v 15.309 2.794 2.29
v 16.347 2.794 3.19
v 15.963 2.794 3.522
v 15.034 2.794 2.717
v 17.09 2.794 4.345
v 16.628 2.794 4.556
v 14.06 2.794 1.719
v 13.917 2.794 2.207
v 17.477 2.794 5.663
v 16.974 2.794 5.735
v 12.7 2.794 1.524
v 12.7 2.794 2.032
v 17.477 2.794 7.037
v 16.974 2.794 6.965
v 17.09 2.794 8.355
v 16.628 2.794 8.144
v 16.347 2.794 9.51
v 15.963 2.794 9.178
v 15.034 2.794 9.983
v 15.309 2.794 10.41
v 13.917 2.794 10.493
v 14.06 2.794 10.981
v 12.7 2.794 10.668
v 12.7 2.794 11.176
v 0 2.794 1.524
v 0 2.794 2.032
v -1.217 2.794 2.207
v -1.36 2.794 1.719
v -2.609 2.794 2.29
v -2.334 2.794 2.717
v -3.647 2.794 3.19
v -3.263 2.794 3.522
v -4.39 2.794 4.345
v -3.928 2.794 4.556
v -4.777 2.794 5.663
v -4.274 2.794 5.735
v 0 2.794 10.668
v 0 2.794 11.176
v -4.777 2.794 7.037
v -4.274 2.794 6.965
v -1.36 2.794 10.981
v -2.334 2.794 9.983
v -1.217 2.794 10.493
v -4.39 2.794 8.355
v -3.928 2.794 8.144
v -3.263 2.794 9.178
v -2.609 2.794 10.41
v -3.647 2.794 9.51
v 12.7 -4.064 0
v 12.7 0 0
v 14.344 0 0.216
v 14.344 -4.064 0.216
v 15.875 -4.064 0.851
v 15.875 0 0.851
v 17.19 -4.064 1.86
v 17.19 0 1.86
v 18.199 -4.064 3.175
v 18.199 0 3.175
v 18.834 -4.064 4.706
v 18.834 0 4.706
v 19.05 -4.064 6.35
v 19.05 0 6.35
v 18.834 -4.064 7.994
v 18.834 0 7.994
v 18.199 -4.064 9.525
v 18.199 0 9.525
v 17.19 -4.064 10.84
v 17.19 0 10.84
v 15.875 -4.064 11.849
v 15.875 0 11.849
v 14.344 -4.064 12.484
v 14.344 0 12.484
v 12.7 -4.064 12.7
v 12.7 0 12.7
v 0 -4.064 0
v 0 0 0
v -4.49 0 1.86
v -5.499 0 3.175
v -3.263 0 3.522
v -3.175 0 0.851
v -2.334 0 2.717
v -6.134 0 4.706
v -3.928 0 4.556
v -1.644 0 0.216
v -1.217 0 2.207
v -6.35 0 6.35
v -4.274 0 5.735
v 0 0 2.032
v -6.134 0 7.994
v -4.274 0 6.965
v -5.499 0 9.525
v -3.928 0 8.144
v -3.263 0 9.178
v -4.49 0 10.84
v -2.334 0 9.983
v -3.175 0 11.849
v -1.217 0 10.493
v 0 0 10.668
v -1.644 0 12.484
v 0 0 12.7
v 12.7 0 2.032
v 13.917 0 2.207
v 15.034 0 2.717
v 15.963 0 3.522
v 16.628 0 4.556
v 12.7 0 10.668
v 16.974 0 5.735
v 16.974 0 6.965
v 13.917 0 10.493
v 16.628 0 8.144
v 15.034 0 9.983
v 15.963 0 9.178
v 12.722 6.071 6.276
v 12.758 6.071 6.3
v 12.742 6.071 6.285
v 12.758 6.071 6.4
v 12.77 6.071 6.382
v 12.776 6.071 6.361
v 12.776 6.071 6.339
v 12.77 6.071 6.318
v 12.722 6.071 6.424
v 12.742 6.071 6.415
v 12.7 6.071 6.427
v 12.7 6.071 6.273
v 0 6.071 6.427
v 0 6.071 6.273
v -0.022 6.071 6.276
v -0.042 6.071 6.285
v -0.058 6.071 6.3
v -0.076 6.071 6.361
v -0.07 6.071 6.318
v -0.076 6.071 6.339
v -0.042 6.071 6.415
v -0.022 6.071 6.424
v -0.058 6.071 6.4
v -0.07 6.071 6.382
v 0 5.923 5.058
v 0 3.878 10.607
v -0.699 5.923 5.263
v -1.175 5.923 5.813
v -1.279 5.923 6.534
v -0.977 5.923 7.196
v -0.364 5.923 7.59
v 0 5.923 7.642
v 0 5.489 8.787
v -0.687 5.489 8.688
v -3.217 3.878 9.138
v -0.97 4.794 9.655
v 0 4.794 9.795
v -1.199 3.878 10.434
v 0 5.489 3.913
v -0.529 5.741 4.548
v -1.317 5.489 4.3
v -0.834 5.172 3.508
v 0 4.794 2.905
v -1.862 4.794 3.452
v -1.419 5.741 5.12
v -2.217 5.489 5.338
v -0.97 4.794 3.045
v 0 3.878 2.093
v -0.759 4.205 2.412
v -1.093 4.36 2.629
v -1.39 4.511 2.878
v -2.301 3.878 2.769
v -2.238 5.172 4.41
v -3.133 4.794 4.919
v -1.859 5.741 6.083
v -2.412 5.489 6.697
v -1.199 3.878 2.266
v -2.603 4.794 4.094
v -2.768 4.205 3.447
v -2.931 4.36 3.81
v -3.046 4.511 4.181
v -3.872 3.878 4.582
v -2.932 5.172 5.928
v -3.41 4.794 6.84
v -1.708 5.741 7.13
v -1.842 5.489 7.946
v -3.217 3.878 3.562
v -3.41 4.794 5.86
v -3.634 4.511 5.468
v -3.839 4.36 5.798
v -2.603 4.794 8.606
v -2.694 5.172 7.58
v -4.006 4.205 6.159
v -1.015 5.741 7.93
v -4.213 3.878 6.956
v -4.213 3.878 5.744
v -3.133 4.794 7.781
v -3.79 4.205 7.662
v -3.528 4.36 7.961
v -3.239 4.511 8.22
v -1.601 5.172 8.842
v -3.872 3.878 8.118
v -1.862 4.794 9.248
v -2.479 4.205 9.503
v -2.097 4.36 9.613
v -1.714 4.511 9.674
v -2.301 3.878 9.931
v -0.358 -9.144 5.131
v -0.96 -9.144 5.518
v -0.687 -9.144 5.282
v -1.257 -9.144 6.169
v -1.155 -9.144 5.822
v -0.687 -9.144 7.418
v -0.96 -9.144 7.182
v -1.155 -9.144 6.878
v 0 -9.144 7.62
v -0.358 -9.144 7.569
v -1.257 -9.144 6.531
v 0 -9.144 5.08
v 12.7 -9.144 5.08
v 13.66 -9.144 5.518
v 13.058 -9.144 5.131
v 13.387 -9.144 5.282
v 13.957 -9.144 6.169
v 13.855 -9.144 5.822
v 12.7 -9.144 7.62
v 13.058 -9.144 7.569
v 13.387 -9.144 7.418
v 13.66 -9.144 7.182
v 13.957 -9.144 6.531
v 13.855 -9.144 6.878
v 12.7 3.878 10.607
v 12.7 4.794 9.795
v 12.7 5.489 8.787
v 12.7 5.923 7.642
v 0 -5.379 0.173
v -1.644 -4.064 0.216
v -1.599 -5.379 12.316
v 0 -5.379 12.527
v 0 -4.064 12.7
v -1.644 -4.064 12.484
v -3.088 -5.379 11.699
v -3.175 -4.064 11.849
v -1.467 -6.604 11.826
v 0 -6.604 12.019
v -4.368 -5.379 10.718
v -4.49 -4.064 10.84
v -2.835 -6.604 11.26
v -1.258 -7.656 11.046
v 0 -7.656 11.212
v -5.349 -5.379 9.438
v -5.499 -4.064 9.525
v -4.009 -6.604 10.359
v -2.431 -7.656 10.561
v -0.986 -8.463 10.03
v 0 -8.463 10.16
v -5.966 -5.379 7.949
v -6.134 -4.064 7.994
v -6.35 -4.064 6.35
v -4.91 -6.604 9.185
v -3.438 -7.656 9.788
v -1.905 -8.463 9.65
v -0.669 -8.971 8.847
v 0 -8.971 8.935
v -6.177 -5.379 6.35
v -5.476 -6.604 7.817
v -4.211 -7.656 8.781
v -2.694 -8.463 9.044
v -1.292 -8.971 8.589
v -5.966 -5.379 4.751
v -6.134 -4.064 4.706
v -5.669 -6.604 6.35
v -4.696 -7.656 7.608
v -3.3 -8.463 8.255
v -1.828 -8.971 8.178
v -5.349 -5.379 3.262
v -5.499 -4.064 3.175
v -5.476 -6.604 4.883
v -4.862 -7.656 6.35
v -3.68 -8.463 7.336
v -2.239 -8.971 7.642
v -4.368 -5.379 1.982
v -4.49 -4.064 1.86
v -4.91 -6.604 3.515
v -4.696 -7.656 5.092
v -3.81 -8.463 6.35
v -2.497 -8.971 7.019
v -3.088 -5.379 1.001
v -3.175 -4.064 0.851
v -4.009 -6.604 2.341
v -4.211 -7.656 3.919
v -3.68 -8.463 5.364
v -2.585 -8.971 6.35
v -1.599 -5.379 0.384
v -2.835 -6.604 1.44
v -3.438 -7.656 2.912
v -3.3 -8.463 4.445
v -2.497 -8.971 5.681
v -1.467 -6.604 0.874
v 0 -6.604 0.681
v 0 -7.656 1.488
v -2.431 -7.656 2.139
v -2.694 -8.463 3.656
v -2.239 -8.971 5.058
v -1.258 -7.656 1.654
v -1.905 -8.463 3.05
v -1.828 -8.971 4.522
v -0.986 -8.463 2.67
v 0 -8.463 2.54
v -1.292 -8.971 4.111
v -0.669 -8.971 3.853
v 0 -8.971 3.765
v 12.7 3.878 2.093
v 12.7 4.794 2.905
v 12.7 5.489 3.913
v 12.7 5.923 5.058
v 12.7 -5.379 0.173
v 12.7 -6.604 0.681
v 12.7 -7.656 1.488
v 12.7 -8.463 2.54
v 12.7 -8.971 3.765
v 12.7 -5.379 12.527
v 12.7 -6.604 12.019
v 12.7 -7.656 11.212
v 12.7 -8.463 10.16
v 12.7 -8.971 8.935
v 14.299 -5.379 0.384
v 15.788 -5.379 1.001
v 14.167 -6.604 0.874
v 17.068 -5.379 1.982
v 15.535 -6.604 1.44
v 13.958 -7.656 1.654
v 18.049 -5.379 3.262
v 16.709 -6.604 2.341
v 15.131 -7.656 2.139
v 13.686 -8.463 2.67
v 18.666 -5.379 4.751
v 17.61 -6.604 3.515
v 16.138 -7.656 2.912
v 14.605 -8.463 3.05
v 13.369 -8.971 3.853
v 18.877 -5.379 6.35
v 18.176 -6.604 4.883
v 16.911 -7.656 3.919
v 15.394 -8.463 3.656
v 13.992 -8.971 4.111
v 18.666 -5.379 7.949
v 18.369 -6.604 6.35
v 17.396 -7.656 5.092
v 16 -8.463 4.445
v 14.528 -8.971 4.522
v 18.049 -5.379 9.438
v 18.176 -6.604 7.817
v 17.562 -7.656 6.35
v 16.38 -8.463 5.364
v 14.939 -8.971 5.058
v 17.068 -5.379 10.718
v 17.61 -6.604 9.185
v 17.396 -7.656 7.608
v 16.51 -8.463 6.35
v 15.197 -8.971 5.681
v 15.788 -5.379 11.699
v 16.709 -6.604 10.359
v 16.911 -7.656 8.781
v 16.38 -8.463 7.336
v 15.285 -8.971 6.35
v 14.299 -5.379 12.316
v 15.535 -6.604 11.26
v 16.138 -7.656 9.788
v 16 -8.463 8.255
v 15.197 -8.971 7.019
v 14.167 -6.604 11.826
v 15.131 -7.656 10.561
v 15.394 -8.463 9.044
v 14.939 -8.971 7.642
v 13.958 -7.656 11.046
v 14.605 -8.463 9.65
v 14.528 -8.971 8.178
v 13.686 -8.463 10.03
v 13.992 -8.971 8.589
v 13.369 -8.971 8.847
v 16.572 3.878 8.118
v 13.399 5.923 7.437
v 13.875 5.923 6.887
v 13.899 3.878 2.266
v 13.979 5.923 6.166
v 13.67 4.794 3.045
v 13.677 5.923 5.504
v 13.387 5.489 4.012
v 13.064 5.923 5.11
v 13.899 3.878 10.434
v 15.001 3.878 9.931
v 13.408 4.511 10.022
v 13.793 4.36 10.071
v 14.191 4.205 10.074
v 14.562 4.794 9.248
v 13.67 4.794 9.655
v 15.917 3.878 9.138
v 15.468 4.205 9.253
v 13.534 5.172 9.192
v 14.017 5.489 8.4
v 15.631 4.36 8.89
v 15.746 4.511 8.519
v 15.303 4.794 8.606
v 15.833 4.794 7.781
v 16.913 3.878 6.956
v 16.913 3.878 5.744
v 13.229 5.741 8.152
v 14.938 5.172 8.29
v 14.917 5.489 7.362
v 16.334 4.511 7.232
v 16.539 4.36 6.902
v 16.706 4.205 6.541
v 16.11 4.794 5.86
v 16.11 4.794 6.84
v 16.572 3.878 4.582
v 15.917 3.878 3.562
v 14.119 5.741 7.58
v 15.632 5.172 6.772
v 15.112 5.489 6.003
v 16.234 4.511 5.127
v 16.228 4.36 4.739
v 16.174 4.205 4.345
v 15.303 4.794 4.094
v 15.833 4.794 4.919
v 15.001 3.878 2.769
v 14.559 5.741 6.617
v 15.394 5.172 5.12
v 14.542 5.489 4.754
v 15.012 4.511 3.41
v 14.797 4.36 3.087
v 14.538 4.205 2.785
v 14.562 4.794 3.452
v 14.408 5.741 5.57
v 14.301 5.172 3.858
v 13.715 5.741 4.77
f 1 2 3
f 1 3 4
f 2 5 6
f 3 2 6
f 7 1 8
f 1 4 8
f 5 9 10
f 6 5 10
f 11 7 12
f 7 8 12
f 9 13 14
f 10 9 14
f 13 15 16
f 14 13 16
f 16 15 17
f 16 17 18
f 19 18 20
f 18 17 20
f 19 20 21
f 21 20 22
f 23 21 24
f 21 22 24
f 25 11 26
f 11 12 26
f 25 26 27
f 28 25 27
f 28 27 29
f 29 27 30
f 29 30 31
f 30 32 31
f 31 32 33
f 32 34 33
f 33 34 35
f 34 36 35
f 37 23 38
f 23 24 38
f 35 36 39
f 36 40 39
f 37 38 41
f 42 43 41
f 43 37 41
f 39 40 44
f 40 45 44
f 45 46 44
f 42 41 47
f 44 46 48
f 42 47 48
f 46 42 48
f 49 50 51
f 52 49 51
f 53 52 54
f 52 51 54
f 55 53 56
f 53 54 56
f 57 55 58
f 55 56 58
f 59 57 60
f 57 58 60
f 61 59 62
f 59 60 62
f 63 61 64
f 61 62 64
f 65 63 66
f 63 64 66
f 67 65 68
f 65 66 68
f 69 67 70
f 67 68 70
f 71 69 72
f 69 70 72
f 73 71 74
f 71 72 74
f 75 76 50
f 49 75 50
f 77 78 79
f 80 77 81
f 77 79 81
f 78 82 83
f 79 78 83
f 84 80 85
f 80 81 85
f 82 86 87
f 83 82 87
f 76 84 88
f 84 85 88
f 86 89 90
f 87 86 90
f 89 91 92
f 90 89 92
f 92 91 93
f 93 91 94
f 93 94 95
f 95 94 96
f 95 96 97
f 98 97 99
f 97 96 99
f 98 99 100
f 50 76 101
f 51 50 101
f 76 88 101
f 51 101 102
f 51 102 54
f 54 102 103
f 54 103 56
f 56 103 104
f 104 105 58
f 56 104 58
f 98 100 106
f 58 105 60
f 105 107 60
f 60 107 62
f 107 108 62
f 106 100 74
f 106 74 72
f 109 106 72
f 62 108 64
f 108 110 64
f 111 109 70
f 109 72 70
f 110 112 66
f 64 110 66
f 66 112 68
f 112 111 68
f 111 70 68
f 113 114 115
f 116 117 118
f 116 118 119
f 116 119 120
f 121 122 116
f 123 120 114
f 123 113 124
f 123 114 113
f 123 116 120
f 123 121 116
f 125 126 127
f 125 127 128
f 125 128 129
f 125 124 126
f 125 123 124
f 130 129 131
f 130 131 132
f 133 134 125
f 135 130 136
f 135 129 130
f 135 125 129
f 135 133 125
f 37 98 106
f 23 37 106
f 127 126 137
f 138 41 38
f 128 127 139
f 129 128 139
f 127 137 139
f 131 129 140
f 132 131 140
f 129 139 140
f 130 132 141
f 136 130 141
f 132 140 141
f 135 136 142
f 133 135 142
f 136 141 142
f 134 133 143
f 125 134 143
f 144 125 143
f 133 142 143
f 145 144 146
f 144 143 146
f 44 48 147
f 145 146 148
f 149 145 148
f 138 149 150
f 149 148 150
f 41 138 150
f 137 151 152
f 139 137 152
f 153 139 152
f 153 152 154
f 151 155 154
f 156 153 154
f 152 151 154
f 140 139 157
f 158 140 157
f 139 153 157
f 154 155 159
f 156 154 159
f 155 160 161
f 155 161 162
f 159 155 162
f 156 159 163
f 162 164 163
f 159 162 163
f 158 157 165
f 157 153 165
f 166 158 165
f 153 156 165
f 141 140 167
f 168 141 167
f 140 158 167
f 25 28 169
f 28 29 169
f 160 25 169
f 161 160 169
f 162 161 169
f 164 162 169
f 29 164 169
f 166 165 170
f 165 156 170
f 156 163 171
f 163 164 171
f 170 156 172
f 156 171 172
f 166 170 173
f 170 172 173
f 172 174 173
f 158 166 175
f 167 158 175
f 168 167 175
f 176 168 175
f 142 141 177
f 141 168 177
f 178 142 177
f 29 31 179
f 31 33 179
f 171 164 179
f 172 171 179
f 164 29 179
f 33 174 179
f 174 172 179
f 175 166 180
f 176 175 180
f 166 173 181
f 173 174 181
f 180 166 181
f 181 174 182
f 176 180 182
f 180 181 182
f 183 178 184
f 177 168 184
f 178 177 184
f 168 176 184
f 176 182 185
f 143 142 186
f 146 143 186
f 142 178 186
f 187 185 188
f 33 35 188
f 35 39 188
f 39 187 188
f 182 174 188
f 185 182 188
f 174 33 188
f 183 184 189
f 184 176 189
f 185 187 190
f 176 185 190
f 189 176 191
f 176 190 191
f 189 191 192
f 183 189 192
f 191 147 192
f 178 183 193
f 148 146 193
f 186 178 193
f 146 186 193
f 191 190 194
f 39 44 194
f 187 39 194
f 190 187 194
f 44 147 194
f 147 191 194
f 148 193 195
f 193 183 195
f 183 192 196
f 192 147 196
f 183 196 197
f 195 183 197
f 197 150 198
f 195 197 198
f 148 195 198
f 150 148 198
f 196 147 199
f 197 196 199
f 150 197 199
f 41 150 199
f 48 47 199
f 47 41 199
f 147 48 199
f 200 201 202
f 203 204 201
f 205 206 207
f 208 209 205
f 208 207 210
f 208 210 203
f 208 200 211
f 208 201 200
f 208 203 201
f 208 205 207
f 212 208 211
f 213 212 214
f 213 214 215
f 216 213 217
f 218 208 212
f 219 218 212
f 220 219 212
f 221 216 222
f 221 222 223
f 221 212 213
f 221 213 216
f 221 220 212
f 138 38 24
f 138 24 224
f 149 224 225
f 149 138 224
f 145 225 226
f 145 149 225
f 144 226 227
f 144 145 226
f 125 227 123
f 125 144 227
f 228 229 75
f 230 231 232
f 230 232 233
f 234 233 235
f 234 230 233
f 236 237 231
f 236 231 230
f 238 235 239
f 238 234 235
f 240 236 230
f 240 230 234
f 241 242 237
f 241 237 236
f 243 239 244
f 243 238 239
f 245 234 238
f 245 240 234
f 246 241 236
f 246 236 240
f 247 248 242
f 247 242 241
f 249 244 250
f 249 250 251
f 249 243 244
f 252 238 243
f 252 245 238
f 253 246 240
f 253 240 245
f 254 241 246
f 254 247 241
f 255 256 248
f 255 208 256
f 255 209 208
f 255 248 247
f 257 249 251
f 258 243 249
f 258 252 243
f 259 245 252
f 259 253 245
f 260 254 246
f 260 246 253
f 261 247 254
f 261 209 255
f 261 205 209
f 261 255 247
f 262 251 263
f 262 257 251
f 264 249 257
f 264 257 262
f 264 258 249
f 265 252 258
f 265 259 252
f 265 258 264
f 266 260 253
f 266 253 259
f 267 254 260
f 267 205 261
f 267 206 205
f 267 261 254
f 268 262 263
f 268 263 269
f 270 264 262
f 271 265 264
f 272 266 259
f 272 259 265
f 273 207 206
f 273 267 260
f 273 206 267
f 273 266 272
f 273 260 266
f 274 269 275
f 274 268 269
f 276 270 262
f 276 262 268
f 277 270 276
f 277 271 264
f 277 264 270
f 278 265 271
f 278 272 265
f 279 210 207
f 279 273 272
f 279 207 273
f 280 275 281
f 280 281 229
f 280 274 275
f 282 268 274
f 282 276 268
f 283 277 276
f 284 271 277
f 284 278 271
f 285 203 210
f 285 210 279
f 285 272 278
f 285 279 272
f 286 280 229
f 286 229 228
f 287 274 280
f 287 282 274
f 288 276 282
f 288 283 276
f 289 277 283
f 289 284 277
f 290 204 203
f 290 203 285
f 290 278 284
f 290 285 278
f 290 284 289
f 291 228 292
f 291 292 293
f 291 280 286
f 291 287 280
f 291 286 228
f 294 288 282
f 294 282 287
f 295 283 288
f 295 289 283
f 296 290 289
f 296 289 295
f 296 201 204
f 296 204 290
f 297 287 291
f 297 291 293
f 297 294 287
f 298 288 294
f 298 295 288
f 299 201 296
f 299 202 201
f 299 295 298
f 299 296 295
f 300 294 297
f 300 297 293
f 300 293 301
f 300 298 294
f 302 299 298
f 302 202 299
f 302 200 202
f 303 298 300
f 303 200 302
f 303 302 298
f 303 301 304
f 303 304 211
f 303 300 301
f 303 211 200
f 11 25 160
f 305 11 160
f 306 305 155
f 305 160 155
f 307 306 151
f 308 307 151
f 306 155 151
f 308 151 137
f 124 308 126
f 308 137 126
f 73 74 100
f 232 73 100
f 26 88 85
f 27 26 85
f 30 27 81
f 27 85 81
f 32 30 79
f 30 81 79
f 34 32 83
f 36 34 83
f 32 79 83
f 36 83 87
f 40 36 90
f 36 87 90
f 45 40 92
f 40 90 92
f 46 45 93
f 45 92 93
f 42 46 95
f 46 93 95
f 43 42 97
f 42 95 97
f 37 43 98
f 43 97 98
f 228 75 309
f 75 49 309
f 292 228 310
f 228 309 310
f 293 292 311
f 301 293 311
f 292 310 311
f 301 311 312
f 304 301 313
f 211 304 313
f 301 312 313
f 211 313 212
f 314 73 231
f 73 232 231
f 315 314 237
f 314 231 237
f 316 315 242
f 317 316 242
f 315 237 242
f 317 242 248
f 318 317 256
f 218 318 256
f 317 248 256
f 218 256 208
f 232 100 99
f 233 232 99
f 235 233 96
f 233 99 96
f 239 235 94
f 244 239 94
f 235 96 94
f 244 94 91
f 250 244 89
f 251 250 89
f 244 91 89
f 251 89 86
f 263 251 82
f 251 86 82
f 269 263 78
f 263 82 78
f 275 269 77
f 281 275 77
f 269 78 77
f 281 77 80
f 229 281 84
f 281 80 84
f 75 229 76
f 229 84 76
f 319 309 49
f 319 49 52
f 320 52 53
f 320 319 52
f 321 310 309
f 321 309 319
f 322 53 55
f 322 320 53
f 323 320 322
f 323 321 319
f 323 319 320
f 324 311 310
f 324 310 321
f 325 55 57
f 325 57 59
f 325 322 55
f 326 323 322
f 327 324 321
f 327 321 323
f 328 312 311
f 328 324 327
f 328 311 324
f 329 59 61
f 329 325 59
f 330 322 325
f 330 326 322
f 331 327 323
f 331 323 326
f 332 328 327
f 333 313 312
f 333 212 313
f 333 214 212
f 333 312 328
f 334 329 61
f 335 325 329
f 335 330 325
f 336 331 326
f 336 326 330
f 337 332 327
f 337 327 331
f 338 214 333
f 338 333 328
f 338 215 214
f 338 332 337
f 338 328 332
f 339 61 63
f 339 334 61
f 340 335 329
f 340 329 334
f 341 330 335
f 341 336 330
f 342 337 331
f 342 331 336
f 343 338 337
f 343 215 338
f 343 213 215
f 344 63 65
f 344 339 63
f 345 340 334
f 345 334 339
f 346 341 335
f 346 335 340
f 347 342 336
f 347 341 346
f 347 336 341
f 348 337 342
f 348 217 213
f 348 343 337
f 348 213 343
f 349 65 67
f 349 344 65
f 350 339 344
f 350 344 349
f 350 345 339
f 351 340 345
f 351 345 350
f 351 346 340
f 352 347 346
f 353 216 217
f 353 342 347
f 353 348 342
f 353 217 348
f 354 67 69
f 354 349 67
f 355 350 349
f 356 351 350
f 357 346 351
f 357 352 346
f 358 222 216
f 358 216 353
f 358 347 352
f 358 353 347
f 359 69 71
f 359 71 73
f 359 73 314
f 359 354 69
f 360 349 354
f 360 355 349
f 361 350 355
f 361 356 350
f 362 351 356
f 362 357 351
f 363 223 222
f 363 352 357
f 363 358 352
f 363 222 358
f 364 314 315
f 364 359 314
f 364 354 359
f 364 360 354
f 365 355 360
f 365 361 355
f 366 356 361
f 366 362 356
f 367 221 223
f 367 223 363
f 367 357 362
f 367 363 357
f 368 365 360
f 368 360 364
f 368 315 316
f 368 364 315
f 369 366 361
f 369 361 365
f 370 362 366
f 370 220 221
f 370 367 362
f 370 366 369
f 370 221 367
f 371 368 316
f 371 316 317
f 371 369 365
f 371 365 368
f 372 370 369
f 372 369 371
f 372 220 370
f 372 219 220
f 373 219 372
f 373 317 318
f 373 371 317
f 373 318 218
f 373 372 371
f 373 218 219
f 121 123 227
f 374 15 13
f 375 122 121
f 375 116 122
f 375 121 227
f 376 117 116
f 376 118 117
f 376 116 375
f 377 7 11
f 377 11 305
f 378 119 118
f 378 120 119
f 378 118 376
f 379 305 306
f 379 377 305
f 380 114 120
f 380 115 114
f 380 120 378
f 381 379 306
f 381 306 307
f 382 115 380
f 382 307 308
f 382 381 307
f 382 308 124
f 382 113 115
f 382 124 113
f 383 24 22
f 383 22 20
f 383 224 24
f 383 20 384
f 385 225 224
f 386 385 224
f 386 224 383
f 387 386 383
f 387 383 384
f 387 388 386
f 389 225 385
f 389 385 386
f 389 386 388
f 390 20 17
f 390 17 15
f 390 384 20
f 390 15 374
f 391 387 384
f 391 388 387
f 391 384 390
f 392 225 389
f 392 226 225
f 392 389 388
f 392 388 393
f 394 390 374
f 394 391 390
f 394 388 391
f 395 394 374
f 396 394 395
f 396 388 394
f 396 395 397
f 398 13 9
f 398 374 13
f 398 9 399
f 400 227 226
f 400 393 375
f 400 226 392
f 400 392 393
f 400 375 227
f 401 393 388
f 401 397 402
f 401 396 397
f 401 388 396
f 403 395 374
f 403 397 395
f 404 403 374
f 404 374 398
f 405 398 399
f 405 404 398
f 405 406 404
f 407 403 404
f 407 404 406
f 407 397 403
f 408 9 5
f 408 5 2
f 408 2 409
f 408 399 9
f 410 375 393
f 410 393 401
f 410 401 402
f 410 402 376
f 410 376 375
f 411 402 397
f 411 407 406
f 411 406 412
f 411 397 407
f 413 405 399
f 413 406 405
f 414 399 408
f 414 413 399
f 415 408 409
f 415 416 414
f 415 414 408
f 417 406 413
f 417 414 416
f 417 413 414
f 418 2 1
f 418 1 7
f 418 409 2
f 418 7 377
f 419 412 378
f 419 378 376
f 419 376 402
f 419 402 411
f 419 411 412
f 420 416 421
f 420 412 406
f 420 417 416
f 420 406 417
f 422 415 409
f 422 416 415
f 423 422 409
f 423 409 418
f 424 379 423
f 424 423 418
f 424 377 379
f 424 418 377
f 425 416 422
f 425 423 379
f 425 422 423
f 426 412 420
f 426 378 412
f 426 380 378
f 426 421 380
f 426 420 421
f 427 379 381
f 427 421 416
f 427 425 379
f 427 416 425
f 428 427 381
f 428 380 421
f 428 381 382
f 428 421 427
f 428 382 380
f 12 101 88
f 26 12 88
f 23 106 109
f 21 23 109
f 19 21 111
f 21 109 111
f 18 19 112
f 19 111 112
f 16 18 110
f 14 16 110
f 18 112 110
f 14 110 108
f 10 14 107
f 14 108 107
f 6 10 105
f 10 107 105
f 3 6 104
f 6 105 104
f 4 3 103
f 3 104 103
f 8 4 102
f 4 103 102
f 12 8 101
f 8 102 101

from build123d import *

# Parameters (mm, degrees)
F1_DEPTH    = 9.144
F3_DEPTH    = 2.794
F5_DEPTH    = 3.2766
F6_T1_DEPTH = 12.7
F6_T4_ANGLE = 180
F6_T6_ANGLE = 180
F7_R        = 5.08


# Not quite as in the source:
# - a fillet or chamfer that OpenCascade refuses, or shapes differently, is made with other operations: its cross-section is extruded or revolved along the edge and cut away or added


with BuildPart() as f1:
    # F0 (on Front) → F1 (new body)
    with BuildSketch(Plane.XZ):
        with BuildLine():
            Line((12.7, 12.7), (0, 12.7))
            ThreePointArc((0, 12.7), (-6.35, 6.35), (0, 0))
            Line((0, 0), (12.7, 0))
            ThreePointArc((12.7, 0), (19.05, 6.35), (12.7, 12.7))
        make_face()
    extrude(amount=F1_DEPTH)

    # F2 (on face) → F3 (join)
    with BuildSketch(Plane(origin=(0, 0, 0), x_dir=(-1, 0, 0), z_dir=(0, 1, 0))):
        with BuildLine():
            ThreePointArc((0, 2.032), (4.318, 6.35), (0, 10.668))
            Line((0, 10.668), (-12.7, 10.668))
            ThreePointArc((-12.7, 10.668), (-17.018, 6.35), (-12.7, 2.032))
            Line((-12.7, 2.032), (0, 2.032))
        make_face()
    extrude(amount=F3_DEPTH)

    # F4 (on face) → F5 (join)
    with BuildSketch(Plane(origin=(0, 2.794, 0), x_dir=(-1, 0, 0), z_dir=(0, 1, 0))):
        with BuildLine():
            Line((-12.7, 1.524), (0, 1.524))
            ThreePointArc((0, 1.524), (4.826, 6.35), (0, 11.176))
            Line((0, 11.176), (-12.7, 11.176))
            ThreePointArc((-12.7, 11.176), (-17.526, 6.35), (-12.7, 1.524))
        make_face()
    extrude(amount=F5_DEPTH)

    # F6: fillet of radius 5.08 on 4 edges, made by hand

    # F6_s2 → F6_t1 (cut)
    with BuildSketch(Plane.YZ):
        with BuildLine():
            ThreePointArc((2.794, 11.176), (5.1719677188, 9.3117646326), (6.0706, 6.4268791929))
            Line((6.0706, 6.4268791929), (6.0706, 11.176))
            Line((6.0706, 11.176), (2.794, 11.176))
        make_face()
        with BuildLine():
            ThreePointArc((2.794, 1.524), (5.1719677188, 3.3882353674), (6.0706, 6.2731208071))
            Line((6.0706, 6.2731208071), (6.0706, 1.524))
            Line((6.0706, 1.524), (2.794, 1.524))
        make_face()
    extrude(amount=F6_T1_DEPTH, mode=Mode.SUBTRACT)

    # F6_s3 → F6_t4 (revolve, cut)
    with BuildSketch(Plane.YZ.offset(12.7)):
        with BuildLine():
            ThreePointArc((2.794, 11.176), (5.1719677188, 9.3117646326), (6.0706, 6.4268791929))
            Line((6.0706, 6.4268791929), (6.0706, 11.176))
            Line((6.0706, 11.176), (2.794, 11.176))
        make_face()
    revolve(axis=Axis((12.7, 6.0706, 6.35), (0, 1, 0)), revolution_arc=F6_T4_ANGLE, mode=Mode.SUBTRACT)

    # F6_s5 → F6_t6 (revolve, cut)
    with BuildSketch(Plane.YZ):
        with BuildLine():
            ThreePointArc((6.0706, 6.2731208071), (5.1719677188, 3.3882353674), (2.794, 1.524))
            Line((2.794, 1.524), (6.0706, 1.524))
            Line((6.0706, 1.524), (6.0706, 6.2731208071))
        make_face()
    revolve(axis=Axis((0, 6.0706, 6.35), (0, 1, 0)), revolution_arc=F6_T6_ANGLE, mode=Mode.SUBTRACT)

    # F7
    f7_edges = [f1.edges().sort_by_distance(p)[0] for p in [
        (6.35, -9.144, 12.7),
        (19.05, -9.144, 6.35),
        (6.35, -9.144, 0),
        (-6.35, -9.144, 6.35),
    ]]
    fillet(f7_edges, radius=F7_R)


solid = f1.part
